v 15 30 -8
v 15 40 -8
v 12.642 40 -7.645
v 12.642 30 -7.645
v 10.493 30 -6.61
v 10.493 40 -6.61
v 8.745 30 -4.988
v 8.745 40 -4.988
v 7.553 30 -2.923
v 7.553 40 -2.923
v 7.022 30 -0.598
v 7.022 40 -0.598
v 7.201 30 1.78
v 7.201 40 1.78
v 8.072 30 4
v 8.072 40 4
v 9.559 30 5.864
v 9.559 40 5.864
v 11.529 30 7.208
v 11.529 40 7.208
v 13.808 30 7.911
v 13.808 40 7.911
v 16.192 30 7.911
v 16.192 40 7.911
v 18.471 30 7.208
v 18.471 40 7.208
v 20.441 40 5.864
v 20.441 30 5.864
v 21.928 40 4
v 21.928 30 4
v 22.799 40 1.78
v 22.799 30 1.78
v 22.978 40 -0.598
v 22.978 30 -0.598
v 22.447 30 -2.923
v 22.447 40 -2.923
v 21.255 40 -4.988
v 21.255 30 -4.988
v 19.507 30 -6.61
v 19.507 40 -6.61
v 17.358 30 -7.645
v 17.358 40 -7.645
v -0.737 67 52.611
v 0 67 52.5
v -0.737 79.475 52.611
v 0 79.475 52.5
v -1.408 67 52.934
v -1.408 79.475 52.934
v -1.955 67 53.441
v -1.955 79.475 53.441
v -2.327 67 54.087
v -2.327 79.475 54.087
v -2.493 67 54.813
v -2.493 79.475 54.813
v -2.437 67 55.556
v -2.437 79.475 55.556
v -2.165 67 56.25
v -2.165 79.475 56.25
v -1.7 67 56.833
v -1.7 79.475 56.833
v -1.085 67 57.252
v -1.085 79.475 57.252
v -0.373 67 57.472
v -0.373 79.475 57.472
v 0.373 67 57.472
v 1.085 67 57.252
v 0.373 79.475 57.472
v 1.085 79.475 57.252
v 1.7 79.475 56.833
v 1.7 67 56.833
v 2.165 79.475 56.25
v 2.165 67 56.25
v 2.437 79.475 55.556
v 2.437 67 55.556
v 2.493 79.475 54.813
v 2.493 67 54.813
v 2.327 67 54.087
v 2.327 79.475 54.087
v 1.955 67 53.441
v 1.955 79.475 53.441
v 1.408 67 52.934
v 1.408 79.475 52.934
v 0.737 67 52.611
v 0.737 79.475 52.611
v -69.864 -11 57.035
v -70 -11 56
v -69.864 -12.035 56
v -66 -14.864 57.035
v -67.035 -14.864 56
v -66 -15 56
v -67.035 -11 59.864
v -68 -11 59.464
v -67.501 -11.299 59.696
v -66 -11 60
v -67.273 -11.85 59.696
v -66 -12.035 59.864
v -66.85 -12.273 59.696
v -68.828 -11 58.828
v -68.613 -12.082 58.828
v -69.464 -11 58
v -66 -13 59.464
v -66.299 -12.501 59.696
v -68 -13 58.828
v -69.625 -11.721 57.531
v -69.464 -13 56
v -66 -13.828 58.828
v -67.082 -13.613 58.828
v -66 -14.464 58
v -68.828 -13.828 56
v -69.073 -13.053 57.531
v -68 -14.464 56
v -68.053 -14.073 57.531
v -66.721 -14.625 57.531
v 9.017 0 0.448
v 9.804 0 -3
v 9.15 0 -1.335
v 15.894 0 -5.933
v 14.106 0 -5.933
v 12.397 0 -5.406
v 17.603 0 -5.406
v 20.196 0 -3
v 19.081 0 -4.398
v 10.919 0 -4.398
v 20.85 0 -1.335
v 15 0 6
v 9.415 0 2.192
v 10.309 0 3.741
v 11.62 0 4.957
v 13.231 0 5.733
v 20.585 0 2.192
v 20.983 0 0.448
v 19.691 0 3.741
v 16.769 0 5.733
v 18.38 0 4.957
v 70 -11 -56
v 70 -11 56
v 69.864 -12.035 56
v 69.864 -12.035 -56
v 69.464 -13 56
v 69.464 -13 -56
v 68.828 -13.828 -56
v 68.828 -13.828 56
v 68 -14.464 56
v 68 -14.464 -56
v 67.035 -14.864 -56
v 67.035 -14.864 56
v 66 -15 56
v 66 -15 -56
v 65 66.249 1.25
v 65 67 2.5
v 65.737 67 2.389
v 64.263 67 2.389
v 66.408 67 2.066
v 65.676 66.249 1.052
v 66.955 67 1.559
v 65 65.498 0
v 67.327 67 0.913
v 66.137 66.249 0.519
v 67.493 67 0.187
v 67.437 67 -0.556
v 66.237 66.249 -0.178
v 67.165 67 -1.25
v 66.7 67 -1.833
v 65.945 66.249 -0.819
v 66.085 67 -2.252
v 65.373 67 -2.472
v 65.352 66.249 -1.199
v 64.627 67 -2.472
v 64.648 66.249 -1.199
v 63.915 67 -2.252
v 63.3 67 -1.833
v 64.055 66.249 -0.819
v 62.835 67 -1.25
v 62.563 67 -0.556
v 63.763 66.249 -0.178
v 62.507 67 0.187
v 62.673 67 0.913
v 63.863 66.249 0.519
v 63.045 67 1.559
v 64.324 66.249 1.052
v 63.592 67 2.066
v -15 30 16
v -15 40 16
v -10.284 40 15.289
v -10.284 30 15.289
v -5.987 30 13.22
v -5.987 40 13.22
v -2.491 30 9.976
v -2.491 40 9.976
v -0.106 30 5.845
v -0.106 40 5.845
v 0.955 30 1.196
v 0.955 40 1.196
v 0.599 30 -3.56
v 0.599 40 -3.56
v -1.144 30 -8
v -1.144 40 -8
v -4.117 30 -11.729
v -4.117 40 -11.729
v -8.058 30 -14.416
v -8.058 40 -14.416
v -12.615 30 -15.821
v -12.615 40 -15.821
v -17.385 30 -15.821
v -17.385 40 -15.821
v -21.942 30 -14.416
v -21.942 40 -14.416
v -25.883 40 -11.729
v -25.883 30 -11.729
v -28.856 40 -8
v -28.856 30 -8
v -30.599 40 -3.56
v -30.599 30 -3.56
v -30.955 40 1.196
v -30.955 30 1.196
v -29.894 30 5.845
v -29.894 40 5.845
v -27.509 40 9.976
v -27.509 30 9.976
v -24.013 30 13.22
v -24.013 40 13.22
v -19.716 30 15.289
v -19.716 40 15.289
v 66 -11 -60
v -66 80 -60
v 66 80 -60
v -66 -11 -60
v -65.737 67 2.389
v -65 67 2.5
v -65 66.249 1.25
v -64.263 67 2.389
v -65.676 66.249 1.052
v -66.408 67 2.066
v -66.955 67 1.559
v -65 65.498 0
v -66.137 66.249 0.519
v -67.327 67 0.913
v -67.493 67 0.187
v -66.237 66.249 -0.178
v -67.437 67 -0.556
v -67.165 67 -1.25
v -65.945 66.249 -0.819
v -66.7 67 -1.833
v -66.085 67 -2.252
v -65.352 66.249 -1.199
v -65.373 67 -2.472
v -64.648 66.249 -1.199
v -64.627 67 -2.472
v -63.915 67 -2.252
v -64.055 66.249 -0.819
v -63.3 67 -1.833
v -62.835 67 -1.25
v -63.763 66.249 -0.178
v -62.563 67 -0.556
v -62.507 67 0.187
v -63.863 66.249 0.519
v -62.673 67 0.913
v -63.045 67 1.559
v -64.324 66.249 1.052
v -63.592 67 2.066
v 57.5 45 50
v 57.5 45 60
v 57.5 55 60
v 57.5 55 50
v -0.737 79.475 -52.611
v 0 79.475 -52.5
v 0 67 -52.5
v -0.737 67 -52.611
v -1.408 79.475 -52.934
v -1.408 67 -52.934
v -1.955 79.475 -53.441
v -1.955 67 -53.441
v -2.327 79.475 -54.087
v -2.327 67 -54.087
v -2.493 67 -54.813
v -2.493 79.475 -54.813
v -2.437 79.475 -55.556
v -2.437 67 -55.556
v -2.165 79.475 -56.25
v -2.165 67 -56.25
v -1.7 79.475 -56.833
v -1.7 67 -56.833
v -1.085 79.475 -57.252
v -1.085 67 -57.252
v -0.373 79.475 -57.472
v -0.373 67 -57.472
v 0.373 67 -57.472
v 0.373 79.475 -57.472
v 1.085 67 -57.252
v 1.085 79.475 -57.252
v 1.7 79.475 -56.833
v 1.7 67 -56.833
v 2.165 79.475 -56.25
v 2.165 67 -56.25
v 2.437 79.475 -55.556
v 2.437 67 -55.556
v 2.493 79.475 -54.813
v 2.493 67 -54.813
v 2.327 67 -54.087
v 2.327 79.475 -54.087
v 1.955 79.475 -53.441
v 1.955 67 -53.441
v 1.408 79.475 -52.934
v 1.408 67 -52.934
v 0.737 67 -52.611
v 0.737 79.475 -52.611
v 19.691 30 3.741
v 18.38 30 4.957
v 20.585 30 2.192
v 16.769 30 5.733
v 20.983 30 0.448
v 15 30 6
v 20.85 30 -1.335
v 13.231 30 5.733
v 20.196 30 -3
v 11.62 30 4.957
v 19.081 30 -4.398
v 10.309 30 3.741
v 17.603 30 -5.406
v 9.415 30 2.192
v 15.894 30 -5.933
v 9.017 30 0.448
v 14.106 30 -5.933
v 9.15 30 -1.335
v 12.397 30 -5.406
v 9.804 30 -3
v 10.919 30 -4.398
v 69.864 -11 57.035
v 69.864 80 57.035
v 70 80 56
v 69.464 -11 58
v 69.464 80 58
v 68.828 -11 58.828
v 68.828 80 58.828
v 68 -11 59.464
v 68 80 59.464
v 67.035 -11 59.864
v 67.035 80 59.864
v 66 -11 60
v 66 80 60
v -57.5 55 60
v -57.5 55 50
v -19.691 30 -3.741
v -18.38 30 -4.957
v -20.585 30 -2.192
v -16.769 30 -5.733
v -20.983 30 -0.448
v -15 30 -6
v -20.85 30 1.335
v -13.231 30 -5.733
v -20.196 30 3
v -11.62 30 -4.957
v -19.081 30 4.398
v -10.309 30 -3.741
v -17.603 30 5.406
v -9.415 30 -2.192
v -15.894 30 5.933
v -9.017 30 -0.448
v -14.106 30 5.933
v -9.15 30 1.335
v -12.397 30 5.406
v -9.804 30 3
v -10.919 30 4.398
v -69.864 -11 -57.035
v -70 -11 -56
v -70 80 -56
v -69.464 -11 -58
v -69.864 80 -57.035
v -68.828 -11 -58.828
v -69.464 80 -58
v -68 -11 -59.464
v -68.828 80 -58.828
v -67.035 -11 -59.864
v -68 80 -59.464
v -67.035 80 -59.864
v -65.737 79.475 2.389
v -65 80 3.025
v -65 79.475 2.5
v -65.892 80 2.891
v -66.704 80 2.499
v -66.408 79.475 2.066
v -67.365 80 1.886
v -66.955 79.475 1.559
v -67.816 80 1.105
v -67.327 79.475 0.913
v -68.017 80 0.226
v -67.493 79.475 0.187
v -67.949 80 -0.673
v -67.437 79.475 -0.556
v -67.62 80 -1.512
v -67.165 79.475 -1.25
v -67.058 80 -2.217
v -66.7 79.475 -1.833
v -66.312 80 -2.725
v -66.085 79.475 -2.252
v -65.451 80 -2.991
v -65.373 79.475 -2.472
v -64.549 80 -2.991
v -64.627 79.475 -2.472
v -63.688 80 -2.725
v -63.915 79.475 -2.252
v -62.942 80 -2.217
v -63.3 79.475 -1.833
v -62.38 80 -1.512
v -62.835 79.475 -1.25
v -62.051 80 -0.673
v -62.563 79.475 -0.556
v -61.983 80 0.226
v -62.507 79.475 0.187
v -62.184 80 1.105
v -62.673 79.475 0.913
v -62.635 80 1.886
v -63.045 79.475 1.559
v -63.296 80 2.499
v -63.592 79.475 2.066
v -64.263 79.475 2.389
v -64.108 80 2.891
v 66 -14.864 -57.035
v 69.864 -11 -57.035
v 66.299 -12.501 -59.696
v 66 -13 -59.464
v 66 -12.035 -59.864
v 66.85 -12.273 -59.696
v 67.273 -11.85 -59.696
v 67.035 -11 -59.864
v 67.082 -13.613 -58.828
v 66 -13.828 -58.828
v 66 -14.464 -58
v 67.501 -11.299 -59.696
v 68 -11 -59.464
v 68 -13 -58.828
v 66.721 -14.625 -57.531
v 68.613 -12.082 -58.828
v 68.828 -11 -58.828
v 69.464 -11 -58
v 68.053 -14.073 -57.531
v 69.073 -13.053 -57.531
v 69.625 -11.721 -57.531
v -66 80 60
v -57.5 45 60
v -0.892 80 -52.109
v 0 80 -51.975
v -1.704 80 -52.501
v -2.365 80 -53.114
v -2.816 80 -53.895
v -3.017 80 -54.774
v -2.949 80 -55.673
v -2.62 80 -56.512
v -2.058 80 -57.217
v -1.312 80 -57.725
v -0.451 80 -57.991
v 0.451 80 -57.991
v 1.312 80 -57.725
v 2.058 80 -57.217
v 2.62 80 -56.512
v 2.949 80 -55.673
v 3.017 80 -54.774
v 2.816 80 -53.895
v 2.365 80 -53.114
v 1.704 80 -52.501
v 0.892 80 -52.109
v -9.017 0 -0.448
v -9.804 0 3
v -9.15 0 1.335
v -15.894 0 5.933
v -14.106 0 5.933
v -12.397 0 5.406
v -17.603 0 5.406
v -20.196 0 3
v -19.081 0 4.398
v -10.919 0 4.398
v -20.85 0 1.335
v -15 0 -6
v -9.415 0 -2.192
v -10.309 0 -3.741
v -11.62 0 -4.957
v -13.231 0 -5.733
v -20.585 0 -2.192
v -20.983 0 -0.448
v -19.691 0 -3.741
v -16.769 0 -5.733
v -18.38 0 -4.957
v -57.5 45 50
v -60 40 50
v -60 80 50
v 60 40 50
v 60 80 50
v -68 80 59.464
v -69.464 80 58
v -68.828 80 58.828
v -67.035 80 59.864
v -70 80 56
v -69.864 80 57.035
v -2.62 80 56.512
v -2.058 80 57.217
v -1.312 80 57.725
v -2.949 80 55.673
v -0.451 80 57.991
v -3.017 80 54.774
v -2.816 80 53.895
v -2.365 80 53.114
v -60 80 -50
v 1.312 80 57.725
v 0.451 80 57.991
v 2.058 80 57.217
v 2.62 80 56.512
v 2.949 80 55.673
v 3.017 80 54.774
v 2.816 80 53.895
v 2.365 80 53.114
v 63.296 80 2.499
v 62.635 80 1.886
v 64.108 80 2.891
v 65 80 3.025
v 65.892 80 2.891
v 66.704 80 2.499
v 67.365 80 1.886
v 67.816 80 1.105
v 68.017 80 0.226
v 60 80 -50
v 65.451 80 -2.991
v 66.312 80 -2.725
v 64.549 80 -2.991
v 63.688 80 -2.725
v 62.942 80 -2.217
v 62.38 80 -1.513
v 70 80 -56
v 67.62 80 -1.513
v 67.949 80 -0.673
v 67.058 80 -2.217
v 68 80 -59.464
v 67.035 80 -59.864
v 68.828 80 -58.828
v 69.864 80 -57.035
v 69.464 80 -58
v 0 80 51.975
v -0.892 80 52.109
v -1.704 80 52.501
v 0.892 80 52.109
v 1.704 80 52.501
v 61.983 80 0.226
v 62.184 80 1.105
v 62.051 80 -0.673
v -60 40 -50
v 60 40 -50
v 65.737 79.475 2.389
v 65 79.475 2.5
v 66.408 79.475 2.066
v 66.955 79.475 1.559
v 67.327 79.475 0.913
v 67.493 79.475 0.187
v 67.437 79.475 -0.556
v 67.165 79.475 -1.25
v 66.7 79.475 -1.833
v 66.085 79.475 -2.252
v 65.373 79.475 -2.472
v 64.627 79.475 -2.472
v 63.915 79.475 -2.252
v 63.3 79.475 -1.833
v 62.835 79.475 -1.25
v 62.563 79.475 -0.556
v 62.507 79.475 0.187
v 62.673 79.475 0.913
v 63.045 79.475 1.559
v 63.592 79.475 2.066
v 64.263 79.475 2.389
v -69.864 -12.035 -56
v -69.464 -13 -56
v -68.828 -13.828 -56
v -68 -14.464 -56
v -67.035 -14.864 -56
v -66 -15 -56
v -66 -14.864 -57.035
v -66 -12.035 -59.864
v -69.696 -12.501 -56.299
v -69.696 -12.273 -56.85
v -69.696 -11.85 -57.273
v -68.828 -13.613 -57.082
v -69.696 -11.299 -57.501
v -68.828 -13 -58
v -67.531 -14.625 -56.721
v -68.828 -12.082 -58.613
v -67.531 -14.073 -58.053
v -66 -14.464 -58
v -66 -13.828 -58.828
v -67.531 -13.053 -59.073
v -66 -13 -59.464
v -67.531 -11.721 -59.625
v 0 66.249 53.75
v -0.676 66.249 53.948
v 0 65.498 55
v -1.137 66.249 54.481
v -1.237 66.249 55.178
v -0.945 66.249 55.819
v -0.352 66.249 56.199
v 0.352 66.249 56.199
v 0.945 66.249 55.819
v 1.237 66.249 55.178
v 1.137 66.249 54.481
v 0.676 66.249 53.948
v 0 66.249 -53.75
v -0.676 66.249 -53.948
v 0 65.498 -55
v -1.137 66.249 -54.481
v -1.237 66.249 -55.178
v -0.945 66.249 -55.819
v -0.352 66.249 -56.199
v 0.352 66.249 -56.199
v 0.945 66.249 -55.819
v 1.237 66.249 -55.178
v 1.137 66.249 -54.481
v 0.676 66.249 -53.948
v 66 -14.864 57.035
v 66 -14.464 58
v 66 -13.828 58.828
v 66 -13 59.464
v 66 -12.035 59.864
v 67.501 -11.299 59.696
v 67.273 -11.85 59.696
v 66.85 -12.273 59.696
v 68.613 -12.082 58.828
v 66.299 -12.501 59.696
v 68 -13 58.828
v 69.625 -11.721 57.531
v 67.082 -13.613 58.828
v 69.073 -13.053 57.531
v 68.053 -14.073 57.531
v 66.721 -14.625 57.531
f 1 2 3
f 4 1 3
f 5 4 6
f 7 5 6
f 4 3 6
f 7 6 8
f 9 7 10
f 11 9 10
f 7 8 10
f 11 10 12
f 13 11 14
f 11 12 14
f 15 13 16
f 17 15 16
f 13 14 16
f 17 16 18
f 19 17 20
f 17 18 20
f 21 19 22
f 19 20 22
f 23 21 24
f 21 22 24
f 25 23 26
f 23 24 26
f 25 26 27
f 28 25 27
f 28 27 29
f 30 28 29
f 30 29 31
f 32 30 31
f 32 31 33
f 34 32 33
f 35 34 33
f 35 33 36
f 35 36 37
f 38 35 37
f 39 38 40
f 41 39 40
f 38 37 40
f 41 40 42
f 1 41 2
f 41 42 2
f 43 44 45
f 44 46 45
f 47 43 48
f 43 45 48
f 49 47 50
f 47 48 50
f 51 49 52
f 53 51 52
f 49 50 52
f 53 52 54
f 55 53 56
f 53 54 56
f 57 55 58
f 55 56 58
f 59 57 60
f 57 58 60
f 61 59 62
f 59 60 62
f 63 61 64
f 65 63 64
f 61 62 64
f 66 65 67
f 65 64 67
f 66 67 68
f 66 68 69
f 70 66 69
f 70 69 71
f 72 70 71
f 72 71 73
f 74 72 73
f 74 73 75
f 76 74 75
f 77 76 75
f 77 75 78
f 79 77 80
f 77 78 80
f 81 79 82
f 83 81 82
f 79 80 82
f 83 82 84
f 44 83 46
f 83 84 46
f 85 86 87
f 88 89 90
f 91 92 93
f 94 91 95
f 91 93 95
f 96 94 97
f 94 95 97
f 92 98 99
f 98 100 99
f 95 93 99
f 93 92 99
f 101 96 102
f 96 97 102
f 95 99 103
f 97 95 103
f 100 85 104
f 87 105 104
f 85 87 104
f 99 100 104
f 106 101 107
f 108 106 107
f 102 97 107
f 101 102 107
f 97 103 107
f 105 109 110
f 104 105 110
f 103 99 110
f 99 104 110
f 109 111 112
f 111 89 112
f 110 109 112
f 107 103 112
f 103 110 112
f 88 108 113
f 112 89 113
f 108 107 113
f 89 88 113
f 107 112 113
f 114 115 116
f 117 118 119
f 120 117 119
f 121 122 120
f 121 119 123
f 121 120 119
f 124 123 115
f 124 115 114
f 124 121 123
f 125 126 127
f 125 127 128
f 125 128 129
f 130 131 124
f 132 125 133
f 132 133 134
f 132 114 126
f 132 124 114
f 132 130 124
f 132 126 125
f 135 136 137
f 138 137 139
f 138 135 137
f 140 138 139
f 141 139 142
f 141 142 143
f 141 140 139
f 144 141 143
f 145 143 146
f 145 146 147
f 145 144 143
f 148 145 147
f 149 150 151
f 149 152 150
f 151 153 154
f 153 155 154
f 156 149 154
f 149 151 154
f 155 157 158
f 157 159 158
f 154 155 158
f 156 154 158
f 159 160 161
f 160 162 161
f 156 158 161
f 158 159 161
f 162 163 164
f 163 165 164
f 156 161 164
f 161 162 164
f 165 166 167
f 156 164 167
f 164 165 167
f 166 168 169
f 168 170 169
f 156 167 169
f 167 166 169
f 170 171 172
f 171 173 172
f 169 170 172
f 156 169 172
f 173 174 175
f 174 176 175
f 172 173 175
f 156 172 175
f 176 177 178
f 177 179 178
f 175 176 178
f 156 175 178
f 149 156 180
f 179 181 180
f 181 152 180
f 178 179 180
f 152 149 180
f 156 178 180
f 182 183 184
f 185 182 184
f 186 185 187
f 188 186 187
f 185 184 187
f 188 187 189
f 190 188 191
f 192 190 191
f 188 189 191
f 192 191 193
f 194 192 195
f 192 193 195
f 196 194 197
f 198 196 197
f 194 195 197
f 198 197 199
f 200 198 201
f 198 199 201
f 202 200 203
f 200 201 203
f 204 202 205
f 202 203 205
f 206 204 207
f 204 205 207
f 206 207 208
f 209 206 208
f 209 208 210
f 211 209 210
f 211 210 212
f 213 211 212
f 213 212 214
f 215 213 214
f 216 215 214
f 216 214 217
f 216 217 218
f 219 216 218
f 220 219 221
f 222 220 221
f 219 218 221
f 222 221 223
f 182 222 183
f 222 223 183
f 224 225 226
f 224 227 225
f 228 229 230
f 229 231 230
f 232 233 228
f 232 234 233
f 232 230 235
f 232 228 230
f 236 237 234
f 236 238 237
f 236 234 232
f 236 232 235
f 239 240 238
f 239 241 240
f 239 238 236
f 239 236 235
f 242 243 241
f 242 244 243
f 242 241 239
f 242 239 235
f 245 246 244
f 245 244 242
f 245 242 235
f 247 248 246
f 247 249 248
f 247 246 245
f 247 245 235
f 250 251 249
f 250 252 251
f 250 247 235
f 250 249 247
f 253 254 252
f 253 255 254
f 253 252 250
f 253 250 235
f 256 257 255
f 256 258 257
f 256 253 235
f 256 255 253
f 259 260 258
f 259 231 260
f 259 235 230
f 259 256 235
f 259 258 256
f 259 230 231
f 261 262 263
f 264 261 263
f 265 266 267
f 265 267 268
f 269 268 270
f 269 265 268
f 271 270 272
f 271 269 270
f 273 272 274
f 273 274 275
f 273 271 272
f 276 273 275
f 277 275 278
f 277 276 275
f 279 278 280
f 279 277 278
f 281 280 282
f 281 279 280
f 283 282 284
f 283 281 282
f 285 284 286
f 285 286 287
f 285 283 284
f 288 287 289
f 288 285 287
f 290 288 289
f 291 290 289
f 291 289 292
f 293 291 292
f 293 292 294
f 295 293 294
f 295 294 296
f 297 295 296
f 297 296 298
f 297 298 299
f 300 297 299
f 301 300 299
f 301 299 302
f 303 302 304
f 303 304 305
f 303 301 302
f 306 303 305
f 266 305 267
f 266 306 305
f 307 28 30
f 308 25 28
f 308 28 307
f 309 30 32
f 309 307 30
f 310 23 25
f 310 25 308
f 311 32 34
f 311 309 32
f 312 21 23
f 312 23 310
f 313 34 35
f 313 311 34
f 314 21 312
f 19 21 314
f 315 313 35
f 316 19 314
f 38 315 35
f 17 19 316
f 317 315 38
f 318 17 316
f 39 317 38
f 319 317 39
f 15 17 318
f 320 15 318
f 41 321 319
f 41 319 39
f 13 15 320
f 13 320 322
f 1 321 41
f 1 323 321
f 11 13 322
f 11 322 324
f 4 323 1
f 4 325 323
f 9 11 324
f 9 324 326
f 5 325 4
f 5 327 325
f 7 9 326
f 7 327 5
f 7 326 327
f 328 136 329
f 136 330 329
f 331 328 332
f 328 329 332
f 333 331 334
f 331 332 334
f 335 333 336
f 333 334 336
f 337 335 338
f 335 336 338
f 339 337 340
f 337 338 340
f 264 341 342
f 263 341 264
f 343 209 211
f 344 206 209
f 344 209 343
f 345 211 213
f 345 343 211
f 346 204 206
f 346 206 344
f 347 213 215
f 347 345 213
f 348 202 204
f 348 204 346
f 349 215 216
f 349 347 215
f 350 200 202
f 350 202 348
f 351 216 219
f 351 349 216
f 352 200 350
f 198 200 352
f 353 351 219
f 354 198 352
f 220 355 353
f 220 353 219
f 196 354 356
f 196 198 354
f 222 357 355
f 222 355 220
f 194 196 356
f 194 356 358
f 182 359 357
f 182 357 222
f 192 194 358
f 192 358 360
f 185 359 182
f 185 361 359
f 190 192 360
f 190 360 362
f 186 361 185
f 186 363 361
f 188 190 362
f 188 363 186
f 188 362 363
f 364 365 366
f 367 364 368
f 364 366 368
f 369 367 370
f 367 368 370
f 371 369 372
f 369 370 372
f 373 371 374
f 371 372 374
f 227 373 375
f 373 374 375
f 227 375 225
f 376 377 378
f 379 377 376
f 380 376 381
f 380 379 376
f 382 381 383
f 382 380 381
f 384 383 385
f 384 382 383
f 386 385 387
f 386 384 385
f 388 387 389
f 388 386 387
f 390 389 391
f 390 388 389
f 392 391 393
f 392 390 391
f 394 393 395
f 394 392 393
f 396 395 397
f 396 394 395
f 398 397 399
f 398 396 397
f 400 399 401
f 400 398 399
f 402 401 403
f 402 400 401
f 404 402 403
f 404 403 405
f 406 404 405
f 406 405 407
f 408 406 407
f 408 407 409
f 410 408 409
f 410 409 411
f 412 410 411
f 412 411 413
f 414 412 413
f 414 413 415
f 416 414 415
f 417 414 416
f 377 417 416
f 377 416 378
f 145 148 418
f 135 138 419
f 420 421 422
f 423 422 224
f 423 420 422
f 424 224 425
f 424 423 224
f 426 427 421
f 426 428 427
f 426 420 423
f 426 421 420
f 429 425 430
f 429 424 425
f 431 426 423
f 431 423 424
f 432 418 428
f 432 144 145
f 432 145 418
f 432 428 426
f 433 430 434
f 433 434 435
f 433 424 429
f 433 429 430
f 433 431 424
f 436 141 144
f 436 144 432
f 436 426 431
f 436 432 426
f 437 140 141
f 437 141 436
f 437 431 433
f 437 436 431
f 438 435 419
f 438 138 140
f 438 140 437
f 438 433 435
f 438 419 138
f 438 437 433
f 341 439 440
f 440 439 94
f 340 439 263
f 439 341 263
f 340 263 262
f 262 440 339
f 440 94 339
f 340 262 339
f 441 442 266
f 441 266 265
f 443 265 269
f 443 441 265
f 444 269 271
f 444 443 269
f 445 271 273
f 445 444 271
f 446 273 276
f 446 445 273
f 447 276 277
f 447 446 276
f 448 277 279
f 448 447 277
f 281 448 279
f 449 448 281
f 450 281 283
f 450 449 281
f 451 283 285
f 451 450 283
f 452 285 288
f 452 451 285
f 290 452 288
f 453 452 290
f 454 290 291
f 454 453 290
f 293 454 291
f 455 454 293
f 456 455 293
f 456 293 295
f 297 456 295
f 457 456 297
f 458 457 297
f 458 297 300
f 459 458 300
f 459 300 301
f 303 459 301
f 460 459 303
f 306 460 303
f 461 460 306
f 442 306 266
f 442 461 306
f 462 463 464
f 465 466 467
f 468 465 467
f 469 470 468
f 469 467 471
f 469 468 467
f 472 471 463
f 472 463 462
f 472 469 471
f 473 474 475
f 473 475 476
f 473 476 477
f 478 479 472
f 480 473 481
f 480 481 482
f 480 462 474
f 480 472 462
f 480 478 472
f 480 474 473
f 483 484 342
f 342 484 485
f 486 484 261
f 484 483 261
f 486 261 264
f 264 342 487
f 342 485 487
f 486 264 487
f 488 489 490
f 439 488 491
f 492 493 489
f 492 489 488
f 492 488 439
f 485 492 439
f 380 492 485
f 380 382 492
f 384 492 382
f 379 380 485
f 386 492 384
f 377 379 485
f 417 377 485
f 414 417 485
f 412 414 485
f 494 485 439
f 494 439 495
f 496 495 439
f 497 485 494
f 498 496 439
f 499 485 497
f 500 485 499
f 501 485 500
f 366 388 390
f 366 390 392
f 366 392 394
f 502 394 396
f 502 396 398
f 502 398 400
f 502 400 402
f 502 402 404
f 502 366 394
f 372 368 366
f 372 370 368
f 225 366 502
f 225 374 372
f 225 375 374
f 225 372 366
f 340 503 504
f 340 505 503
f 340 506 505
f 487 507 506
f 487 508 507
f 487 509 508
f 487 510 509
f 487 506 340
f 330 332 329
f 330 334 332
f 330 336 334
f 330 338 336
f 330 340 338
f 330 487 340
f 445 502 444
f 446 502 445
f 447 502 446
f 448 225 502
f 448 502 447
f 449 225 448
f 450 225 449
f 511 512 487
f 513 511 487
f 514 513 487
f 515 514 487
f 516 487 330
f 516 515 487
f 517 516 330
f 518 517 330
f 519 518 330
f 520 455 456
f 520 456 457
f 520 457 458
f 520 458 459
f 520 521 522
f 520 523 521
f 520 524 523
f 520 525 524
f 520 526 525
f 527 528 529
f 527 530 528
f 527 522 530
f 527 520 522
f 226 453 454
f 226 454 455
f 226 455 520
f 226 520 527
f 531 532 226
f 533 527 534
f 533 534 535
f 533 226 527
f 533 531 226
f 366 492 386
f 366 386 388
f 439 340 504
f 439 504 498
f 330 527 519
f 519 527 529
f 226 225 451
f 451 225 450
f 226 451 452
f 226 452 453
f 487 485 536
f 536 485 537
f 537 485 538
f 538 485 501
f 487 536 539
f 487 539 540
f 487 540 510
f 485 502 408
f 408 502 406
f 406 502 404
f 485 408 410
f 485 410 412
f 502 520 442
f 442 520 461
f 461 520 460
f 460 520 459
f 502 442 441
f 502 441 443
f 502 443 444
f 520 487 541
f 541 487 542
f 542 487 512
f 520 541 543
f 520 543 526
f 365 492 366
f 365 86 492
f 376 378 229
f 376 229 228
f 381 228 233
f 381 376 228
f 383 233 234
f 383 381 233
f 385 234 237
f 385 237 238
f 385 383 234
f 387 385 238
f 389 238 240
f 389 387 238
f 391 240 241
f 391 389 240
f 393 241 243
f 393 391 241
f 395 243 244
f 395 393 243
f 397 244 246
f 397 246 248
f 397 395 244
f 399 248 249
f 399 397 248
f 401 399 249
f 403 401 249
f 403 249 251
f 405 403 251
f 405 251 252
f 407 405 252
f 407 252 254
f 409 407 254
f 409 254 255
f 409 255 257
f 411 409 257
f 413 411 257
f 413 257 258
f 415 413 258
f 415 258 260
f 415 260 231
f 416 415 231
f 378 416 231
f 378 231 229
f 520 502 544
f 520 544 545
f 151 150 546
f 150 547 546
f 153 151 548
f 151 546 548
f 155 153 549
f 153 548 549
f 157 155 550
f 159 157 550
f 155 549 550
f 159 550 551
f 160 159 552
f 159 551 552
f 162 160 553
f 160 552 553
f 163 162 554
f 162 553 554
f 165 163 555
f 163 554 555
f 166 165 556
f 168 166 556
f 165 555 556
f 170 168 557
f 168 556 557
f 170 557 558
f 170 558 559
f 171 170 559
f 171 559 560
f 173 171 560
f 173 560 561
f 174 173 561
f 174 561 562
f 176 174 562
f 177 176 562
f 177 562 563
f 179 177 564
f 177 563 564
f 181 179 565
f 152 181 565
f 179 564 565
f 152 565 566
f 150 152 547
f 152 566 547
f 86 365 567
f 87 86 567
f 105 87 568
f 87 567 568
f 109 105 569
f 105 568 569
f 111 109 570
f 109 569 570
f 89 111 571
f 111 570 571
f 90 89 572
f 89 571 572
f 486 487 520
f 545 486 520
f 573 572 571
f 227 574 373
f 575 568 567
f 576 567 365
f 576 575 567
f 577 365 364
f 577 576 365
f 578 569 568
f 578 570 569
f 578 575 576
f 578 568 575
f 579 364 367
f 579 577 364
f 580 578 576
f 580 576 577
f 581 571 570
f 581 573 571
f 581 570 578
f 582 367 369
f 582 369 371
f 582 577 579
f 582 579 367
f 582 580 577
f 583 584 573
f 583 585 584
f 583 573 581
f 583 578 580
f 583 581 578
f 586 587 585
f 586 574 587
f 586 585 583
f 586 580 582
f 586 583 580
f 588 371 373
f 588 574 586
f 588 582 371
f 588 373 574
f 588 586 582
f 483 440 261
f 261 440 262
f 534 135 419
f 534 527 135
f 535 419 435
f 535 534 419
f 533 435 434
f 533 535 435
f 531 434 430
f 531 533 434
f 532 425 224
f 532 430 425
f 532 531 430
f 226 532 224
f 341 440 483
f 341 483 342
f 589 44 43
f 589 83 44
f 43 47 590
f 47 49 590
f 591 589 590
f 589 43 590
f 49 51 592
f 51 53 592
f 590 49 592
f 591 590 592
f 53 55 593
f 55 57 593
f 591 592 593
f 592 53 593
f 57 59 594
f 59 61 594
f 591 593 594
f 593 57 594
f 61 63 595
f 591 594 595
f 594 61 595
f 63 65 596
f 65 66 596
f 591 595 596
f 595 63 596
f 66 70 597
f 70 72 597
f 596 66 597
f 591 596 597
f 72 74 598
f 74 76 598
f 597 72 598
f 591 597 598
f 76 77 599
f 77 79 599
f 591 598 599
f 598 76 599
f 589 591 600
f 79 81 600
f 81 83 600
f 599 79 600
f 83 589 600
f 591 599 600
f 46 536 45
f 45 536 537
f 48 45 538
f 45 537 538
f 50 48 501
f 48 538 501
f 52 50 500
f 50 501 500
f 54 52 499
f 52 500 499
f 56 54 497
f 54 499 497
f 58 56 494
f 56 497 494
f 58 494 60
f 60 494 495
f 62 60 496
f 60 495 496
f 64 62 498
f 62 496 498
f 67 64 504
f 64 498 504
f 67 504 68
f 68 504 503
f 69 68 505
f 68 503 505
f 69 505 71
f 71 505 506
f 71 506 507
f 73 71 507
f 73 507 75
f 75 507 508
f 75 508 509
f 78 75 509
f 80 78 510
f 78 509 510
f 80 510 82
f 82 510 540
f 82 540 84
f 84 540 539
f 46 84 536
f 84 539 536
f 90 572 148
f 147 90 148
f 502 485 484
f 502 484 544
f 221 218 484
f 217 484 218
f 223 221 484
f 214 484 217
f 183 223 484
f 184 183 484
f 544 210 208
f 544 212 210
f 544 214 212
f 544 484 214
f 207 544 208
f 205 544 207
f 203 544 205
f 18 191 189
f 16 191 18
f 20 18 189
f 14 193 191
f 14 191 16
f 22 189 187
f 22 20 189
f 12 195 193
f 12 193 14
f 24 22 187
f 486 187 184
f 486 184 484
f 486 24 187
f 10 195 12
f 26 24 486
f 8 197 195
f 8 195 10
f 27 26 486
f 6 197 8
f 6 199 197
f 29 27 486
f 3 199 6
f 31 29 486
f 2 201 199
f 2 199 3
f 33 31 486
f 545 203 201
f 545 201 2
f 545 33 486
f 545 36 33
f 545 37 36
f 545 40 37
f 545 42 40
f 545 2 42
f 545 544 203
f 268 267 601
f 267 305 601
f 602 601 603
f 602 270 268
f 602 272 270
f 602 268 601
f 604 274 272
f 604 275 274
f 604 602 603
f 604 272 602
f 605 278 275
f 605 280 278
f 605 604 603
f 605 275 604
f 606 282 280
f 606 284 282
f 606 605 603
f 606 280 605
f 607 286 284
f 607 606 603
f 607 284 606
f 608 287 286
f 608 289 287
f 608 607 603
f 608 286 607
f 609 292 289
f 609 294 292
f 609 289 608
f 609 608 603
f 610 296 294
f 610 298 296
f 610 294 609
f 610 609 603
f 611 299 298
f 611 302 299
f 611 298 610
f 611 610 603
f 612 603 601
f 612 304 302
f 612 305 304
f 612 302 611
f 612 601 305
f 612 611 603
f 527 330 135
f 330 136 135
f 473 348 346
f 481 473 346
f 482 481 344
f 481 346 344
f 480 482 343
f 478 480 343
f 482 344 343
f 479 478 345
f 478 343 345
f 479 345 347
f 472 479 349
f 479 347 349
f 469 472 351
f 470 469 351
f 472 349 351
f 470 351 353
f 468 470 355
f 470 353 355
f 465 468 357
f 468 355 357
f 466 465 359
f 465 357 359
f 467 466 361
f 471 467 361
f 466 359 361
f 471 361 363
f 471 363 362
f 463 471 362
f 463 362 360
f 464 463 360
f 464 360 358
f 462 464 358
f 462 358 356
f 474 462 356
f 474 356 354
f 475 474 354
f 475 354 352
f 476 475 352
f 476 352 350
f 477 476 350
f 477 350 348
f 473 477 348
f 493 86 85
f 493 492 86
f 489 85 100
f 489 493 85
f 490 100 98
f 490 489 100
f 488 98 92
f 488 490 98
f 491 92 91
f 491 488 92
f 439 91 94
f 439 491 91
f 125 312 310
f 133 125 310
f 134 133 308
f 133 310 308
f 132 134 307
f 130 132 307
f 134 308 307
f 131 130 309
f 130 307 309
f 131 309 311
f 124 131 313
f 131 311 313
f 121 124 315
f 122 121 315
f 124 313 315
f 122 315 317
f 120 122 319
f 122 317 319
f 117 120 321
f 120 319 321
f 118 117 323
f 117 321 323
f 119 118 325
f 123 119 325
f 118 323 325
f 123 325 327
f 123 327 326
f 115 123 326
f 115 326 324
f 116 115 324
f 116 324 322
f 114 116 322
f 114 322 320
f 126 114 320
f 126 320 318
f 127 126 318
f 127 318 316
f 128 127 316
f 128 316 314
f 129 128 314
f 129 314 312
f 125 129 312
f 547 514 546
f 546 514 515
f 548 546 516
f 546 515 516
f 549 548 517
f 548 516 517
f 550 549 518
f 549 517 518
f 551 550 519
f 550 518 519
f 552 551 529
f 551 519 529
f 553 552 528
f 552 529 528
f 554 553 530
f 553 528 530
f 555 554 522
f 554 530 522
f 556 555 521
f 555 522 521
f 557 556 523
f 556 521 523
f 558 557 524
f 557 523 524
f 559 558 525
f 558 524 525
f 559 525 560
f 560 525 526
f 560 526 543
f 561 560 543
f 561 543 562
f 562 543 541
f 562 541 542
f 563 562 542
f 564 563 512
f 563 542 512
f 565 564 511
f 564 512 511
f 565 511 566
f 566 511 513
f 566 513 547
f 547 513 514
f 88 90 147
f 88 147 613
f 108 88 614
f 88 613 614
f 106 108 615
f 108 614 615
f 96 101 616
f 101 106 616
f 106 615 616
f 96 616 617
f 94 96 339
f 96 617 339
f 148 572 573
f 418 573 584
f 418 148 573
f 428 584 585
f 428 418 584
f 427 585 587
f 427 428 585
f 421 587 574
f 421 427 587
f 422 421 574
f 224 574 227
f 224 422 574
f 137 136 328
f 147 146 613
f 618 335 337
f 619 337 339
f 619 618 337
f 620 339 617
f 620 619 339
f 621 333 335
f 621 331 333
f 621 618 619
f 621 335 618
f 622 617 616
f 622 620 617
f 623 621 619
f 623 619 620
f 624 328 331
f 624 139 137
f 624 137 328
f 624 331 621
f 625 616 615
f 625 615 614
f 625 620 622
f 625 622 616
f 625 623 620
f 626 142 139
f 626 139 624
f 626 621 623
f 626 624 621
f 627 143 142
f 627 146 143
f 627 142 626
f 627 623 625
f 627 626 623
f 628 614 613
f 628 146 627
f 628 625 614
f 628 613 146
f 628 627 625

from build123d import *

# Parameters (mm, degrees)
BOX_EXTRUDE_PART_DEPTH         = 80
BOX_EXTRUDE_PART_DEPTH_BACK    = 15
BOX_TOP_VIEW_W                 = 140
BOX_TOP_VIEW_H                 = 120
INNER_BOX_CUT_W                = 120
INNER_BOX_CUT_H                = 100
INNER_BOX_CUT_1_DEPTH          = 40
SCISSOR_CROSSSECTION_W         = 115
SCISSOR_CROSSSECTION_H         = 10
SCISSOR_CORSSSECTION_CUT_DEPTH = 10
SHAFT_LOCATION_R               = 6
SHAFT_LOCATION_CUT_DEPTH       = 40
SKETCH2_R                      = 16
SKETCH2_R_2                    = 8
BEARING_LOCATION_CUT1_DEPTH    = 10
M6_TAPPED_HOLE3_AT_2_COUNT     = 2
M6_TAPPED_HOLE3_AT_2_PITCH     = 85.14693183
EDGES_FILLET_R                 = 4


with BuildPart() as part:
    # Box_top_view → Box_extrude_part (new, two sides: drawn at the far end of the back side and taken through both)
    with BuildSketch(Plane(origin=(0, 0, 0), x_dir=(1, 0, 0), z_dir=(0, 1, 0)).offset(-BOX_EXTRUDE_PART_DEPTH_BACK)):
        Rectangle(BOX_TOP_VIEW_W, BOX_TOP_VIEW_H)
    extrude(amount=BOX_EXTRUDE_PART_DEPTH + BOX_EXTRUDE_PART_DEPTH_BACK)

    # Inner_box_cut → Inner_box_cut_1 (cut)
    with BuildSketch(Plane(origin=(0, 80, 0), x_dir=(1, 0, 0), z_dir=(0, 1, 0))):
        Rectangle(INNER_BOX_CUT_W, INNER_BOX_CUT_H)
    extrude(amount=-INNER_BOX_CUT_1_DEPTH, mode=Mode.SUBTRACT)

    # Scissor_crossSection → Scissor_corssSection_cut (cut)
    with BuildSketch(Plane.XY.offset(60)):
        with Locations((0, 50)):
            Rectangle(SCISSOR_CROSSSECTION_W, SCISSOR_CROSSSECTION_H)
    extrude(amount=-SCISSOR_CORSSSECTION_CUT_DEPTH, mode=Mode.SUBTRACT)

    # Shaft_location → Shaft_location_cut (cut)
    with BuildSketch(Plane(origin=(0, 40, 0), x_dir=(1, 0, 0), z_dir=(0, 1, 0))):
        with Locations(Location((15, 0, 0), (0, 0, 270))):
            Circle(SHAFT_LOCATION_R)
        with Locations(Location((-15, 0, 0), (0, 0, 90))):
            Circle(SHAFT_LOCATION_R)
    extrude(amount=-SHAFT_LOCATION_CUT_DEPTH, mode=Mode.SUBTRACT)

    # Sketch2 → Bearing_location_cut1 (cut)
    with BuildSketch(Plane(origin=(0, 40, 0), x_dir=(1, 0, 0), z_dir=(0, 1, 0))):
        with Locations(Location((-15, 0, 0), (0, 0, 270))):
            Circle(SKETCH2_R)
        with Locations(Location((15, 0, 0), (0, 0, 90))):
            Circle(SKETCH2_R_2)
    extrude(amount=-BEARING_LOCATION_CUT1_DEPTH, mode=Mode.SUBTRACT)

    # Sketch7 → M6 Tapped Hole3 (revolve, cut)
    with BuildSketch(Plane(origin=(0, 80, -55), x_dir=(0, 0, 1), z_dir=(1, 0, 0))):
        Polygon((0, 0), (0, 14.502151548), (2.5, 13), (2.5, 0.525), (3.025, 0), align=None)
    m6_tapped_hole3 = revolve(axis=Axis((0, 86.35, -55), (0, -1, 0)), mode=Mode.SUBTRACT)

    # M6 Tapped Hole3 at 2: M6 Tapped Hole3 ×2
    with Locations(*[Vector(-0.7633862853691146, 0, 0.645942241466174) * (i * M6_TAPPED_HOLE3_AT_2_PITCH) for i in range(1, M6_TAPPED_HOLE3_AT_2_COUNT)]):
        add(m6_tapped_hole3, mode=Mode.SUBTRACT)

    # M6_hole_mirror: M6 Tapped Hole3 across plane
    add(m6_tapped_hole3.mirror(Plane(origin=(0, 0, 0), x_dir=(0, 0, 1), z_dir=(1, 0, 0))), mode=Mode.SUBTRACT)

    # M6_hole_mirror copy 1 sketch → M6_hole_mirror copy 1 (revolve, cut)
    with BuildSketch(Plane(origin=(65, 80, 0), x_dir=(0, 0, 1), z_dir=(-1, 0, 0))):
        Polygon((0, 0), (0, -14.502151548), (2.5, -13), (2.5, -0.525), (3.025, 0), align=None)
    revolve(axis=Axis((65, 86.35, 0), (0, 1, 0)), mode=Mode.SUBTRACT)

    # M6_hole_mirror at the second plane: M6 Tapped Hole3 across plane
    add(m6_tapped_hole3.mirror(Plane.XY), mode=Mode.SUBTRACT)

    # M6_hole_mirror at the second plane copy → M6_hole_mirror at the second plane c 2 (revolve, cut)
    with BuildSketch(Plane(origin=(-65, 80, 0), x_dir=(0, 0, -1), z_dir=(1, 0, 0))):
        Polygon((0, 0), (0, -14.502151548), (2.5, -13), (2.5, -0.525), (3.025, 0), align=None)
    revolve(axis=Axis((-65, 86.35, 0), (0, 1, 0)), mode=Mode.SUBTRACT)

    # Edges_fillet
    edges_fillet_edges = [part.edges().sort_by_distance(p)[0] for p in [
        (70, -15, 0),
        (0, -15, -60),
        (-70, -15, 0),
        (-70, 32.5, -60),
        (70, 32.5, -60),
        (70, 32.5, 60),
        (-70, 32.5, 60),
        (0, -15, 60),
    ]]
    fillet(edges_fillet_edges, radius=EDGES_FILLET_R)


solid = part.part
